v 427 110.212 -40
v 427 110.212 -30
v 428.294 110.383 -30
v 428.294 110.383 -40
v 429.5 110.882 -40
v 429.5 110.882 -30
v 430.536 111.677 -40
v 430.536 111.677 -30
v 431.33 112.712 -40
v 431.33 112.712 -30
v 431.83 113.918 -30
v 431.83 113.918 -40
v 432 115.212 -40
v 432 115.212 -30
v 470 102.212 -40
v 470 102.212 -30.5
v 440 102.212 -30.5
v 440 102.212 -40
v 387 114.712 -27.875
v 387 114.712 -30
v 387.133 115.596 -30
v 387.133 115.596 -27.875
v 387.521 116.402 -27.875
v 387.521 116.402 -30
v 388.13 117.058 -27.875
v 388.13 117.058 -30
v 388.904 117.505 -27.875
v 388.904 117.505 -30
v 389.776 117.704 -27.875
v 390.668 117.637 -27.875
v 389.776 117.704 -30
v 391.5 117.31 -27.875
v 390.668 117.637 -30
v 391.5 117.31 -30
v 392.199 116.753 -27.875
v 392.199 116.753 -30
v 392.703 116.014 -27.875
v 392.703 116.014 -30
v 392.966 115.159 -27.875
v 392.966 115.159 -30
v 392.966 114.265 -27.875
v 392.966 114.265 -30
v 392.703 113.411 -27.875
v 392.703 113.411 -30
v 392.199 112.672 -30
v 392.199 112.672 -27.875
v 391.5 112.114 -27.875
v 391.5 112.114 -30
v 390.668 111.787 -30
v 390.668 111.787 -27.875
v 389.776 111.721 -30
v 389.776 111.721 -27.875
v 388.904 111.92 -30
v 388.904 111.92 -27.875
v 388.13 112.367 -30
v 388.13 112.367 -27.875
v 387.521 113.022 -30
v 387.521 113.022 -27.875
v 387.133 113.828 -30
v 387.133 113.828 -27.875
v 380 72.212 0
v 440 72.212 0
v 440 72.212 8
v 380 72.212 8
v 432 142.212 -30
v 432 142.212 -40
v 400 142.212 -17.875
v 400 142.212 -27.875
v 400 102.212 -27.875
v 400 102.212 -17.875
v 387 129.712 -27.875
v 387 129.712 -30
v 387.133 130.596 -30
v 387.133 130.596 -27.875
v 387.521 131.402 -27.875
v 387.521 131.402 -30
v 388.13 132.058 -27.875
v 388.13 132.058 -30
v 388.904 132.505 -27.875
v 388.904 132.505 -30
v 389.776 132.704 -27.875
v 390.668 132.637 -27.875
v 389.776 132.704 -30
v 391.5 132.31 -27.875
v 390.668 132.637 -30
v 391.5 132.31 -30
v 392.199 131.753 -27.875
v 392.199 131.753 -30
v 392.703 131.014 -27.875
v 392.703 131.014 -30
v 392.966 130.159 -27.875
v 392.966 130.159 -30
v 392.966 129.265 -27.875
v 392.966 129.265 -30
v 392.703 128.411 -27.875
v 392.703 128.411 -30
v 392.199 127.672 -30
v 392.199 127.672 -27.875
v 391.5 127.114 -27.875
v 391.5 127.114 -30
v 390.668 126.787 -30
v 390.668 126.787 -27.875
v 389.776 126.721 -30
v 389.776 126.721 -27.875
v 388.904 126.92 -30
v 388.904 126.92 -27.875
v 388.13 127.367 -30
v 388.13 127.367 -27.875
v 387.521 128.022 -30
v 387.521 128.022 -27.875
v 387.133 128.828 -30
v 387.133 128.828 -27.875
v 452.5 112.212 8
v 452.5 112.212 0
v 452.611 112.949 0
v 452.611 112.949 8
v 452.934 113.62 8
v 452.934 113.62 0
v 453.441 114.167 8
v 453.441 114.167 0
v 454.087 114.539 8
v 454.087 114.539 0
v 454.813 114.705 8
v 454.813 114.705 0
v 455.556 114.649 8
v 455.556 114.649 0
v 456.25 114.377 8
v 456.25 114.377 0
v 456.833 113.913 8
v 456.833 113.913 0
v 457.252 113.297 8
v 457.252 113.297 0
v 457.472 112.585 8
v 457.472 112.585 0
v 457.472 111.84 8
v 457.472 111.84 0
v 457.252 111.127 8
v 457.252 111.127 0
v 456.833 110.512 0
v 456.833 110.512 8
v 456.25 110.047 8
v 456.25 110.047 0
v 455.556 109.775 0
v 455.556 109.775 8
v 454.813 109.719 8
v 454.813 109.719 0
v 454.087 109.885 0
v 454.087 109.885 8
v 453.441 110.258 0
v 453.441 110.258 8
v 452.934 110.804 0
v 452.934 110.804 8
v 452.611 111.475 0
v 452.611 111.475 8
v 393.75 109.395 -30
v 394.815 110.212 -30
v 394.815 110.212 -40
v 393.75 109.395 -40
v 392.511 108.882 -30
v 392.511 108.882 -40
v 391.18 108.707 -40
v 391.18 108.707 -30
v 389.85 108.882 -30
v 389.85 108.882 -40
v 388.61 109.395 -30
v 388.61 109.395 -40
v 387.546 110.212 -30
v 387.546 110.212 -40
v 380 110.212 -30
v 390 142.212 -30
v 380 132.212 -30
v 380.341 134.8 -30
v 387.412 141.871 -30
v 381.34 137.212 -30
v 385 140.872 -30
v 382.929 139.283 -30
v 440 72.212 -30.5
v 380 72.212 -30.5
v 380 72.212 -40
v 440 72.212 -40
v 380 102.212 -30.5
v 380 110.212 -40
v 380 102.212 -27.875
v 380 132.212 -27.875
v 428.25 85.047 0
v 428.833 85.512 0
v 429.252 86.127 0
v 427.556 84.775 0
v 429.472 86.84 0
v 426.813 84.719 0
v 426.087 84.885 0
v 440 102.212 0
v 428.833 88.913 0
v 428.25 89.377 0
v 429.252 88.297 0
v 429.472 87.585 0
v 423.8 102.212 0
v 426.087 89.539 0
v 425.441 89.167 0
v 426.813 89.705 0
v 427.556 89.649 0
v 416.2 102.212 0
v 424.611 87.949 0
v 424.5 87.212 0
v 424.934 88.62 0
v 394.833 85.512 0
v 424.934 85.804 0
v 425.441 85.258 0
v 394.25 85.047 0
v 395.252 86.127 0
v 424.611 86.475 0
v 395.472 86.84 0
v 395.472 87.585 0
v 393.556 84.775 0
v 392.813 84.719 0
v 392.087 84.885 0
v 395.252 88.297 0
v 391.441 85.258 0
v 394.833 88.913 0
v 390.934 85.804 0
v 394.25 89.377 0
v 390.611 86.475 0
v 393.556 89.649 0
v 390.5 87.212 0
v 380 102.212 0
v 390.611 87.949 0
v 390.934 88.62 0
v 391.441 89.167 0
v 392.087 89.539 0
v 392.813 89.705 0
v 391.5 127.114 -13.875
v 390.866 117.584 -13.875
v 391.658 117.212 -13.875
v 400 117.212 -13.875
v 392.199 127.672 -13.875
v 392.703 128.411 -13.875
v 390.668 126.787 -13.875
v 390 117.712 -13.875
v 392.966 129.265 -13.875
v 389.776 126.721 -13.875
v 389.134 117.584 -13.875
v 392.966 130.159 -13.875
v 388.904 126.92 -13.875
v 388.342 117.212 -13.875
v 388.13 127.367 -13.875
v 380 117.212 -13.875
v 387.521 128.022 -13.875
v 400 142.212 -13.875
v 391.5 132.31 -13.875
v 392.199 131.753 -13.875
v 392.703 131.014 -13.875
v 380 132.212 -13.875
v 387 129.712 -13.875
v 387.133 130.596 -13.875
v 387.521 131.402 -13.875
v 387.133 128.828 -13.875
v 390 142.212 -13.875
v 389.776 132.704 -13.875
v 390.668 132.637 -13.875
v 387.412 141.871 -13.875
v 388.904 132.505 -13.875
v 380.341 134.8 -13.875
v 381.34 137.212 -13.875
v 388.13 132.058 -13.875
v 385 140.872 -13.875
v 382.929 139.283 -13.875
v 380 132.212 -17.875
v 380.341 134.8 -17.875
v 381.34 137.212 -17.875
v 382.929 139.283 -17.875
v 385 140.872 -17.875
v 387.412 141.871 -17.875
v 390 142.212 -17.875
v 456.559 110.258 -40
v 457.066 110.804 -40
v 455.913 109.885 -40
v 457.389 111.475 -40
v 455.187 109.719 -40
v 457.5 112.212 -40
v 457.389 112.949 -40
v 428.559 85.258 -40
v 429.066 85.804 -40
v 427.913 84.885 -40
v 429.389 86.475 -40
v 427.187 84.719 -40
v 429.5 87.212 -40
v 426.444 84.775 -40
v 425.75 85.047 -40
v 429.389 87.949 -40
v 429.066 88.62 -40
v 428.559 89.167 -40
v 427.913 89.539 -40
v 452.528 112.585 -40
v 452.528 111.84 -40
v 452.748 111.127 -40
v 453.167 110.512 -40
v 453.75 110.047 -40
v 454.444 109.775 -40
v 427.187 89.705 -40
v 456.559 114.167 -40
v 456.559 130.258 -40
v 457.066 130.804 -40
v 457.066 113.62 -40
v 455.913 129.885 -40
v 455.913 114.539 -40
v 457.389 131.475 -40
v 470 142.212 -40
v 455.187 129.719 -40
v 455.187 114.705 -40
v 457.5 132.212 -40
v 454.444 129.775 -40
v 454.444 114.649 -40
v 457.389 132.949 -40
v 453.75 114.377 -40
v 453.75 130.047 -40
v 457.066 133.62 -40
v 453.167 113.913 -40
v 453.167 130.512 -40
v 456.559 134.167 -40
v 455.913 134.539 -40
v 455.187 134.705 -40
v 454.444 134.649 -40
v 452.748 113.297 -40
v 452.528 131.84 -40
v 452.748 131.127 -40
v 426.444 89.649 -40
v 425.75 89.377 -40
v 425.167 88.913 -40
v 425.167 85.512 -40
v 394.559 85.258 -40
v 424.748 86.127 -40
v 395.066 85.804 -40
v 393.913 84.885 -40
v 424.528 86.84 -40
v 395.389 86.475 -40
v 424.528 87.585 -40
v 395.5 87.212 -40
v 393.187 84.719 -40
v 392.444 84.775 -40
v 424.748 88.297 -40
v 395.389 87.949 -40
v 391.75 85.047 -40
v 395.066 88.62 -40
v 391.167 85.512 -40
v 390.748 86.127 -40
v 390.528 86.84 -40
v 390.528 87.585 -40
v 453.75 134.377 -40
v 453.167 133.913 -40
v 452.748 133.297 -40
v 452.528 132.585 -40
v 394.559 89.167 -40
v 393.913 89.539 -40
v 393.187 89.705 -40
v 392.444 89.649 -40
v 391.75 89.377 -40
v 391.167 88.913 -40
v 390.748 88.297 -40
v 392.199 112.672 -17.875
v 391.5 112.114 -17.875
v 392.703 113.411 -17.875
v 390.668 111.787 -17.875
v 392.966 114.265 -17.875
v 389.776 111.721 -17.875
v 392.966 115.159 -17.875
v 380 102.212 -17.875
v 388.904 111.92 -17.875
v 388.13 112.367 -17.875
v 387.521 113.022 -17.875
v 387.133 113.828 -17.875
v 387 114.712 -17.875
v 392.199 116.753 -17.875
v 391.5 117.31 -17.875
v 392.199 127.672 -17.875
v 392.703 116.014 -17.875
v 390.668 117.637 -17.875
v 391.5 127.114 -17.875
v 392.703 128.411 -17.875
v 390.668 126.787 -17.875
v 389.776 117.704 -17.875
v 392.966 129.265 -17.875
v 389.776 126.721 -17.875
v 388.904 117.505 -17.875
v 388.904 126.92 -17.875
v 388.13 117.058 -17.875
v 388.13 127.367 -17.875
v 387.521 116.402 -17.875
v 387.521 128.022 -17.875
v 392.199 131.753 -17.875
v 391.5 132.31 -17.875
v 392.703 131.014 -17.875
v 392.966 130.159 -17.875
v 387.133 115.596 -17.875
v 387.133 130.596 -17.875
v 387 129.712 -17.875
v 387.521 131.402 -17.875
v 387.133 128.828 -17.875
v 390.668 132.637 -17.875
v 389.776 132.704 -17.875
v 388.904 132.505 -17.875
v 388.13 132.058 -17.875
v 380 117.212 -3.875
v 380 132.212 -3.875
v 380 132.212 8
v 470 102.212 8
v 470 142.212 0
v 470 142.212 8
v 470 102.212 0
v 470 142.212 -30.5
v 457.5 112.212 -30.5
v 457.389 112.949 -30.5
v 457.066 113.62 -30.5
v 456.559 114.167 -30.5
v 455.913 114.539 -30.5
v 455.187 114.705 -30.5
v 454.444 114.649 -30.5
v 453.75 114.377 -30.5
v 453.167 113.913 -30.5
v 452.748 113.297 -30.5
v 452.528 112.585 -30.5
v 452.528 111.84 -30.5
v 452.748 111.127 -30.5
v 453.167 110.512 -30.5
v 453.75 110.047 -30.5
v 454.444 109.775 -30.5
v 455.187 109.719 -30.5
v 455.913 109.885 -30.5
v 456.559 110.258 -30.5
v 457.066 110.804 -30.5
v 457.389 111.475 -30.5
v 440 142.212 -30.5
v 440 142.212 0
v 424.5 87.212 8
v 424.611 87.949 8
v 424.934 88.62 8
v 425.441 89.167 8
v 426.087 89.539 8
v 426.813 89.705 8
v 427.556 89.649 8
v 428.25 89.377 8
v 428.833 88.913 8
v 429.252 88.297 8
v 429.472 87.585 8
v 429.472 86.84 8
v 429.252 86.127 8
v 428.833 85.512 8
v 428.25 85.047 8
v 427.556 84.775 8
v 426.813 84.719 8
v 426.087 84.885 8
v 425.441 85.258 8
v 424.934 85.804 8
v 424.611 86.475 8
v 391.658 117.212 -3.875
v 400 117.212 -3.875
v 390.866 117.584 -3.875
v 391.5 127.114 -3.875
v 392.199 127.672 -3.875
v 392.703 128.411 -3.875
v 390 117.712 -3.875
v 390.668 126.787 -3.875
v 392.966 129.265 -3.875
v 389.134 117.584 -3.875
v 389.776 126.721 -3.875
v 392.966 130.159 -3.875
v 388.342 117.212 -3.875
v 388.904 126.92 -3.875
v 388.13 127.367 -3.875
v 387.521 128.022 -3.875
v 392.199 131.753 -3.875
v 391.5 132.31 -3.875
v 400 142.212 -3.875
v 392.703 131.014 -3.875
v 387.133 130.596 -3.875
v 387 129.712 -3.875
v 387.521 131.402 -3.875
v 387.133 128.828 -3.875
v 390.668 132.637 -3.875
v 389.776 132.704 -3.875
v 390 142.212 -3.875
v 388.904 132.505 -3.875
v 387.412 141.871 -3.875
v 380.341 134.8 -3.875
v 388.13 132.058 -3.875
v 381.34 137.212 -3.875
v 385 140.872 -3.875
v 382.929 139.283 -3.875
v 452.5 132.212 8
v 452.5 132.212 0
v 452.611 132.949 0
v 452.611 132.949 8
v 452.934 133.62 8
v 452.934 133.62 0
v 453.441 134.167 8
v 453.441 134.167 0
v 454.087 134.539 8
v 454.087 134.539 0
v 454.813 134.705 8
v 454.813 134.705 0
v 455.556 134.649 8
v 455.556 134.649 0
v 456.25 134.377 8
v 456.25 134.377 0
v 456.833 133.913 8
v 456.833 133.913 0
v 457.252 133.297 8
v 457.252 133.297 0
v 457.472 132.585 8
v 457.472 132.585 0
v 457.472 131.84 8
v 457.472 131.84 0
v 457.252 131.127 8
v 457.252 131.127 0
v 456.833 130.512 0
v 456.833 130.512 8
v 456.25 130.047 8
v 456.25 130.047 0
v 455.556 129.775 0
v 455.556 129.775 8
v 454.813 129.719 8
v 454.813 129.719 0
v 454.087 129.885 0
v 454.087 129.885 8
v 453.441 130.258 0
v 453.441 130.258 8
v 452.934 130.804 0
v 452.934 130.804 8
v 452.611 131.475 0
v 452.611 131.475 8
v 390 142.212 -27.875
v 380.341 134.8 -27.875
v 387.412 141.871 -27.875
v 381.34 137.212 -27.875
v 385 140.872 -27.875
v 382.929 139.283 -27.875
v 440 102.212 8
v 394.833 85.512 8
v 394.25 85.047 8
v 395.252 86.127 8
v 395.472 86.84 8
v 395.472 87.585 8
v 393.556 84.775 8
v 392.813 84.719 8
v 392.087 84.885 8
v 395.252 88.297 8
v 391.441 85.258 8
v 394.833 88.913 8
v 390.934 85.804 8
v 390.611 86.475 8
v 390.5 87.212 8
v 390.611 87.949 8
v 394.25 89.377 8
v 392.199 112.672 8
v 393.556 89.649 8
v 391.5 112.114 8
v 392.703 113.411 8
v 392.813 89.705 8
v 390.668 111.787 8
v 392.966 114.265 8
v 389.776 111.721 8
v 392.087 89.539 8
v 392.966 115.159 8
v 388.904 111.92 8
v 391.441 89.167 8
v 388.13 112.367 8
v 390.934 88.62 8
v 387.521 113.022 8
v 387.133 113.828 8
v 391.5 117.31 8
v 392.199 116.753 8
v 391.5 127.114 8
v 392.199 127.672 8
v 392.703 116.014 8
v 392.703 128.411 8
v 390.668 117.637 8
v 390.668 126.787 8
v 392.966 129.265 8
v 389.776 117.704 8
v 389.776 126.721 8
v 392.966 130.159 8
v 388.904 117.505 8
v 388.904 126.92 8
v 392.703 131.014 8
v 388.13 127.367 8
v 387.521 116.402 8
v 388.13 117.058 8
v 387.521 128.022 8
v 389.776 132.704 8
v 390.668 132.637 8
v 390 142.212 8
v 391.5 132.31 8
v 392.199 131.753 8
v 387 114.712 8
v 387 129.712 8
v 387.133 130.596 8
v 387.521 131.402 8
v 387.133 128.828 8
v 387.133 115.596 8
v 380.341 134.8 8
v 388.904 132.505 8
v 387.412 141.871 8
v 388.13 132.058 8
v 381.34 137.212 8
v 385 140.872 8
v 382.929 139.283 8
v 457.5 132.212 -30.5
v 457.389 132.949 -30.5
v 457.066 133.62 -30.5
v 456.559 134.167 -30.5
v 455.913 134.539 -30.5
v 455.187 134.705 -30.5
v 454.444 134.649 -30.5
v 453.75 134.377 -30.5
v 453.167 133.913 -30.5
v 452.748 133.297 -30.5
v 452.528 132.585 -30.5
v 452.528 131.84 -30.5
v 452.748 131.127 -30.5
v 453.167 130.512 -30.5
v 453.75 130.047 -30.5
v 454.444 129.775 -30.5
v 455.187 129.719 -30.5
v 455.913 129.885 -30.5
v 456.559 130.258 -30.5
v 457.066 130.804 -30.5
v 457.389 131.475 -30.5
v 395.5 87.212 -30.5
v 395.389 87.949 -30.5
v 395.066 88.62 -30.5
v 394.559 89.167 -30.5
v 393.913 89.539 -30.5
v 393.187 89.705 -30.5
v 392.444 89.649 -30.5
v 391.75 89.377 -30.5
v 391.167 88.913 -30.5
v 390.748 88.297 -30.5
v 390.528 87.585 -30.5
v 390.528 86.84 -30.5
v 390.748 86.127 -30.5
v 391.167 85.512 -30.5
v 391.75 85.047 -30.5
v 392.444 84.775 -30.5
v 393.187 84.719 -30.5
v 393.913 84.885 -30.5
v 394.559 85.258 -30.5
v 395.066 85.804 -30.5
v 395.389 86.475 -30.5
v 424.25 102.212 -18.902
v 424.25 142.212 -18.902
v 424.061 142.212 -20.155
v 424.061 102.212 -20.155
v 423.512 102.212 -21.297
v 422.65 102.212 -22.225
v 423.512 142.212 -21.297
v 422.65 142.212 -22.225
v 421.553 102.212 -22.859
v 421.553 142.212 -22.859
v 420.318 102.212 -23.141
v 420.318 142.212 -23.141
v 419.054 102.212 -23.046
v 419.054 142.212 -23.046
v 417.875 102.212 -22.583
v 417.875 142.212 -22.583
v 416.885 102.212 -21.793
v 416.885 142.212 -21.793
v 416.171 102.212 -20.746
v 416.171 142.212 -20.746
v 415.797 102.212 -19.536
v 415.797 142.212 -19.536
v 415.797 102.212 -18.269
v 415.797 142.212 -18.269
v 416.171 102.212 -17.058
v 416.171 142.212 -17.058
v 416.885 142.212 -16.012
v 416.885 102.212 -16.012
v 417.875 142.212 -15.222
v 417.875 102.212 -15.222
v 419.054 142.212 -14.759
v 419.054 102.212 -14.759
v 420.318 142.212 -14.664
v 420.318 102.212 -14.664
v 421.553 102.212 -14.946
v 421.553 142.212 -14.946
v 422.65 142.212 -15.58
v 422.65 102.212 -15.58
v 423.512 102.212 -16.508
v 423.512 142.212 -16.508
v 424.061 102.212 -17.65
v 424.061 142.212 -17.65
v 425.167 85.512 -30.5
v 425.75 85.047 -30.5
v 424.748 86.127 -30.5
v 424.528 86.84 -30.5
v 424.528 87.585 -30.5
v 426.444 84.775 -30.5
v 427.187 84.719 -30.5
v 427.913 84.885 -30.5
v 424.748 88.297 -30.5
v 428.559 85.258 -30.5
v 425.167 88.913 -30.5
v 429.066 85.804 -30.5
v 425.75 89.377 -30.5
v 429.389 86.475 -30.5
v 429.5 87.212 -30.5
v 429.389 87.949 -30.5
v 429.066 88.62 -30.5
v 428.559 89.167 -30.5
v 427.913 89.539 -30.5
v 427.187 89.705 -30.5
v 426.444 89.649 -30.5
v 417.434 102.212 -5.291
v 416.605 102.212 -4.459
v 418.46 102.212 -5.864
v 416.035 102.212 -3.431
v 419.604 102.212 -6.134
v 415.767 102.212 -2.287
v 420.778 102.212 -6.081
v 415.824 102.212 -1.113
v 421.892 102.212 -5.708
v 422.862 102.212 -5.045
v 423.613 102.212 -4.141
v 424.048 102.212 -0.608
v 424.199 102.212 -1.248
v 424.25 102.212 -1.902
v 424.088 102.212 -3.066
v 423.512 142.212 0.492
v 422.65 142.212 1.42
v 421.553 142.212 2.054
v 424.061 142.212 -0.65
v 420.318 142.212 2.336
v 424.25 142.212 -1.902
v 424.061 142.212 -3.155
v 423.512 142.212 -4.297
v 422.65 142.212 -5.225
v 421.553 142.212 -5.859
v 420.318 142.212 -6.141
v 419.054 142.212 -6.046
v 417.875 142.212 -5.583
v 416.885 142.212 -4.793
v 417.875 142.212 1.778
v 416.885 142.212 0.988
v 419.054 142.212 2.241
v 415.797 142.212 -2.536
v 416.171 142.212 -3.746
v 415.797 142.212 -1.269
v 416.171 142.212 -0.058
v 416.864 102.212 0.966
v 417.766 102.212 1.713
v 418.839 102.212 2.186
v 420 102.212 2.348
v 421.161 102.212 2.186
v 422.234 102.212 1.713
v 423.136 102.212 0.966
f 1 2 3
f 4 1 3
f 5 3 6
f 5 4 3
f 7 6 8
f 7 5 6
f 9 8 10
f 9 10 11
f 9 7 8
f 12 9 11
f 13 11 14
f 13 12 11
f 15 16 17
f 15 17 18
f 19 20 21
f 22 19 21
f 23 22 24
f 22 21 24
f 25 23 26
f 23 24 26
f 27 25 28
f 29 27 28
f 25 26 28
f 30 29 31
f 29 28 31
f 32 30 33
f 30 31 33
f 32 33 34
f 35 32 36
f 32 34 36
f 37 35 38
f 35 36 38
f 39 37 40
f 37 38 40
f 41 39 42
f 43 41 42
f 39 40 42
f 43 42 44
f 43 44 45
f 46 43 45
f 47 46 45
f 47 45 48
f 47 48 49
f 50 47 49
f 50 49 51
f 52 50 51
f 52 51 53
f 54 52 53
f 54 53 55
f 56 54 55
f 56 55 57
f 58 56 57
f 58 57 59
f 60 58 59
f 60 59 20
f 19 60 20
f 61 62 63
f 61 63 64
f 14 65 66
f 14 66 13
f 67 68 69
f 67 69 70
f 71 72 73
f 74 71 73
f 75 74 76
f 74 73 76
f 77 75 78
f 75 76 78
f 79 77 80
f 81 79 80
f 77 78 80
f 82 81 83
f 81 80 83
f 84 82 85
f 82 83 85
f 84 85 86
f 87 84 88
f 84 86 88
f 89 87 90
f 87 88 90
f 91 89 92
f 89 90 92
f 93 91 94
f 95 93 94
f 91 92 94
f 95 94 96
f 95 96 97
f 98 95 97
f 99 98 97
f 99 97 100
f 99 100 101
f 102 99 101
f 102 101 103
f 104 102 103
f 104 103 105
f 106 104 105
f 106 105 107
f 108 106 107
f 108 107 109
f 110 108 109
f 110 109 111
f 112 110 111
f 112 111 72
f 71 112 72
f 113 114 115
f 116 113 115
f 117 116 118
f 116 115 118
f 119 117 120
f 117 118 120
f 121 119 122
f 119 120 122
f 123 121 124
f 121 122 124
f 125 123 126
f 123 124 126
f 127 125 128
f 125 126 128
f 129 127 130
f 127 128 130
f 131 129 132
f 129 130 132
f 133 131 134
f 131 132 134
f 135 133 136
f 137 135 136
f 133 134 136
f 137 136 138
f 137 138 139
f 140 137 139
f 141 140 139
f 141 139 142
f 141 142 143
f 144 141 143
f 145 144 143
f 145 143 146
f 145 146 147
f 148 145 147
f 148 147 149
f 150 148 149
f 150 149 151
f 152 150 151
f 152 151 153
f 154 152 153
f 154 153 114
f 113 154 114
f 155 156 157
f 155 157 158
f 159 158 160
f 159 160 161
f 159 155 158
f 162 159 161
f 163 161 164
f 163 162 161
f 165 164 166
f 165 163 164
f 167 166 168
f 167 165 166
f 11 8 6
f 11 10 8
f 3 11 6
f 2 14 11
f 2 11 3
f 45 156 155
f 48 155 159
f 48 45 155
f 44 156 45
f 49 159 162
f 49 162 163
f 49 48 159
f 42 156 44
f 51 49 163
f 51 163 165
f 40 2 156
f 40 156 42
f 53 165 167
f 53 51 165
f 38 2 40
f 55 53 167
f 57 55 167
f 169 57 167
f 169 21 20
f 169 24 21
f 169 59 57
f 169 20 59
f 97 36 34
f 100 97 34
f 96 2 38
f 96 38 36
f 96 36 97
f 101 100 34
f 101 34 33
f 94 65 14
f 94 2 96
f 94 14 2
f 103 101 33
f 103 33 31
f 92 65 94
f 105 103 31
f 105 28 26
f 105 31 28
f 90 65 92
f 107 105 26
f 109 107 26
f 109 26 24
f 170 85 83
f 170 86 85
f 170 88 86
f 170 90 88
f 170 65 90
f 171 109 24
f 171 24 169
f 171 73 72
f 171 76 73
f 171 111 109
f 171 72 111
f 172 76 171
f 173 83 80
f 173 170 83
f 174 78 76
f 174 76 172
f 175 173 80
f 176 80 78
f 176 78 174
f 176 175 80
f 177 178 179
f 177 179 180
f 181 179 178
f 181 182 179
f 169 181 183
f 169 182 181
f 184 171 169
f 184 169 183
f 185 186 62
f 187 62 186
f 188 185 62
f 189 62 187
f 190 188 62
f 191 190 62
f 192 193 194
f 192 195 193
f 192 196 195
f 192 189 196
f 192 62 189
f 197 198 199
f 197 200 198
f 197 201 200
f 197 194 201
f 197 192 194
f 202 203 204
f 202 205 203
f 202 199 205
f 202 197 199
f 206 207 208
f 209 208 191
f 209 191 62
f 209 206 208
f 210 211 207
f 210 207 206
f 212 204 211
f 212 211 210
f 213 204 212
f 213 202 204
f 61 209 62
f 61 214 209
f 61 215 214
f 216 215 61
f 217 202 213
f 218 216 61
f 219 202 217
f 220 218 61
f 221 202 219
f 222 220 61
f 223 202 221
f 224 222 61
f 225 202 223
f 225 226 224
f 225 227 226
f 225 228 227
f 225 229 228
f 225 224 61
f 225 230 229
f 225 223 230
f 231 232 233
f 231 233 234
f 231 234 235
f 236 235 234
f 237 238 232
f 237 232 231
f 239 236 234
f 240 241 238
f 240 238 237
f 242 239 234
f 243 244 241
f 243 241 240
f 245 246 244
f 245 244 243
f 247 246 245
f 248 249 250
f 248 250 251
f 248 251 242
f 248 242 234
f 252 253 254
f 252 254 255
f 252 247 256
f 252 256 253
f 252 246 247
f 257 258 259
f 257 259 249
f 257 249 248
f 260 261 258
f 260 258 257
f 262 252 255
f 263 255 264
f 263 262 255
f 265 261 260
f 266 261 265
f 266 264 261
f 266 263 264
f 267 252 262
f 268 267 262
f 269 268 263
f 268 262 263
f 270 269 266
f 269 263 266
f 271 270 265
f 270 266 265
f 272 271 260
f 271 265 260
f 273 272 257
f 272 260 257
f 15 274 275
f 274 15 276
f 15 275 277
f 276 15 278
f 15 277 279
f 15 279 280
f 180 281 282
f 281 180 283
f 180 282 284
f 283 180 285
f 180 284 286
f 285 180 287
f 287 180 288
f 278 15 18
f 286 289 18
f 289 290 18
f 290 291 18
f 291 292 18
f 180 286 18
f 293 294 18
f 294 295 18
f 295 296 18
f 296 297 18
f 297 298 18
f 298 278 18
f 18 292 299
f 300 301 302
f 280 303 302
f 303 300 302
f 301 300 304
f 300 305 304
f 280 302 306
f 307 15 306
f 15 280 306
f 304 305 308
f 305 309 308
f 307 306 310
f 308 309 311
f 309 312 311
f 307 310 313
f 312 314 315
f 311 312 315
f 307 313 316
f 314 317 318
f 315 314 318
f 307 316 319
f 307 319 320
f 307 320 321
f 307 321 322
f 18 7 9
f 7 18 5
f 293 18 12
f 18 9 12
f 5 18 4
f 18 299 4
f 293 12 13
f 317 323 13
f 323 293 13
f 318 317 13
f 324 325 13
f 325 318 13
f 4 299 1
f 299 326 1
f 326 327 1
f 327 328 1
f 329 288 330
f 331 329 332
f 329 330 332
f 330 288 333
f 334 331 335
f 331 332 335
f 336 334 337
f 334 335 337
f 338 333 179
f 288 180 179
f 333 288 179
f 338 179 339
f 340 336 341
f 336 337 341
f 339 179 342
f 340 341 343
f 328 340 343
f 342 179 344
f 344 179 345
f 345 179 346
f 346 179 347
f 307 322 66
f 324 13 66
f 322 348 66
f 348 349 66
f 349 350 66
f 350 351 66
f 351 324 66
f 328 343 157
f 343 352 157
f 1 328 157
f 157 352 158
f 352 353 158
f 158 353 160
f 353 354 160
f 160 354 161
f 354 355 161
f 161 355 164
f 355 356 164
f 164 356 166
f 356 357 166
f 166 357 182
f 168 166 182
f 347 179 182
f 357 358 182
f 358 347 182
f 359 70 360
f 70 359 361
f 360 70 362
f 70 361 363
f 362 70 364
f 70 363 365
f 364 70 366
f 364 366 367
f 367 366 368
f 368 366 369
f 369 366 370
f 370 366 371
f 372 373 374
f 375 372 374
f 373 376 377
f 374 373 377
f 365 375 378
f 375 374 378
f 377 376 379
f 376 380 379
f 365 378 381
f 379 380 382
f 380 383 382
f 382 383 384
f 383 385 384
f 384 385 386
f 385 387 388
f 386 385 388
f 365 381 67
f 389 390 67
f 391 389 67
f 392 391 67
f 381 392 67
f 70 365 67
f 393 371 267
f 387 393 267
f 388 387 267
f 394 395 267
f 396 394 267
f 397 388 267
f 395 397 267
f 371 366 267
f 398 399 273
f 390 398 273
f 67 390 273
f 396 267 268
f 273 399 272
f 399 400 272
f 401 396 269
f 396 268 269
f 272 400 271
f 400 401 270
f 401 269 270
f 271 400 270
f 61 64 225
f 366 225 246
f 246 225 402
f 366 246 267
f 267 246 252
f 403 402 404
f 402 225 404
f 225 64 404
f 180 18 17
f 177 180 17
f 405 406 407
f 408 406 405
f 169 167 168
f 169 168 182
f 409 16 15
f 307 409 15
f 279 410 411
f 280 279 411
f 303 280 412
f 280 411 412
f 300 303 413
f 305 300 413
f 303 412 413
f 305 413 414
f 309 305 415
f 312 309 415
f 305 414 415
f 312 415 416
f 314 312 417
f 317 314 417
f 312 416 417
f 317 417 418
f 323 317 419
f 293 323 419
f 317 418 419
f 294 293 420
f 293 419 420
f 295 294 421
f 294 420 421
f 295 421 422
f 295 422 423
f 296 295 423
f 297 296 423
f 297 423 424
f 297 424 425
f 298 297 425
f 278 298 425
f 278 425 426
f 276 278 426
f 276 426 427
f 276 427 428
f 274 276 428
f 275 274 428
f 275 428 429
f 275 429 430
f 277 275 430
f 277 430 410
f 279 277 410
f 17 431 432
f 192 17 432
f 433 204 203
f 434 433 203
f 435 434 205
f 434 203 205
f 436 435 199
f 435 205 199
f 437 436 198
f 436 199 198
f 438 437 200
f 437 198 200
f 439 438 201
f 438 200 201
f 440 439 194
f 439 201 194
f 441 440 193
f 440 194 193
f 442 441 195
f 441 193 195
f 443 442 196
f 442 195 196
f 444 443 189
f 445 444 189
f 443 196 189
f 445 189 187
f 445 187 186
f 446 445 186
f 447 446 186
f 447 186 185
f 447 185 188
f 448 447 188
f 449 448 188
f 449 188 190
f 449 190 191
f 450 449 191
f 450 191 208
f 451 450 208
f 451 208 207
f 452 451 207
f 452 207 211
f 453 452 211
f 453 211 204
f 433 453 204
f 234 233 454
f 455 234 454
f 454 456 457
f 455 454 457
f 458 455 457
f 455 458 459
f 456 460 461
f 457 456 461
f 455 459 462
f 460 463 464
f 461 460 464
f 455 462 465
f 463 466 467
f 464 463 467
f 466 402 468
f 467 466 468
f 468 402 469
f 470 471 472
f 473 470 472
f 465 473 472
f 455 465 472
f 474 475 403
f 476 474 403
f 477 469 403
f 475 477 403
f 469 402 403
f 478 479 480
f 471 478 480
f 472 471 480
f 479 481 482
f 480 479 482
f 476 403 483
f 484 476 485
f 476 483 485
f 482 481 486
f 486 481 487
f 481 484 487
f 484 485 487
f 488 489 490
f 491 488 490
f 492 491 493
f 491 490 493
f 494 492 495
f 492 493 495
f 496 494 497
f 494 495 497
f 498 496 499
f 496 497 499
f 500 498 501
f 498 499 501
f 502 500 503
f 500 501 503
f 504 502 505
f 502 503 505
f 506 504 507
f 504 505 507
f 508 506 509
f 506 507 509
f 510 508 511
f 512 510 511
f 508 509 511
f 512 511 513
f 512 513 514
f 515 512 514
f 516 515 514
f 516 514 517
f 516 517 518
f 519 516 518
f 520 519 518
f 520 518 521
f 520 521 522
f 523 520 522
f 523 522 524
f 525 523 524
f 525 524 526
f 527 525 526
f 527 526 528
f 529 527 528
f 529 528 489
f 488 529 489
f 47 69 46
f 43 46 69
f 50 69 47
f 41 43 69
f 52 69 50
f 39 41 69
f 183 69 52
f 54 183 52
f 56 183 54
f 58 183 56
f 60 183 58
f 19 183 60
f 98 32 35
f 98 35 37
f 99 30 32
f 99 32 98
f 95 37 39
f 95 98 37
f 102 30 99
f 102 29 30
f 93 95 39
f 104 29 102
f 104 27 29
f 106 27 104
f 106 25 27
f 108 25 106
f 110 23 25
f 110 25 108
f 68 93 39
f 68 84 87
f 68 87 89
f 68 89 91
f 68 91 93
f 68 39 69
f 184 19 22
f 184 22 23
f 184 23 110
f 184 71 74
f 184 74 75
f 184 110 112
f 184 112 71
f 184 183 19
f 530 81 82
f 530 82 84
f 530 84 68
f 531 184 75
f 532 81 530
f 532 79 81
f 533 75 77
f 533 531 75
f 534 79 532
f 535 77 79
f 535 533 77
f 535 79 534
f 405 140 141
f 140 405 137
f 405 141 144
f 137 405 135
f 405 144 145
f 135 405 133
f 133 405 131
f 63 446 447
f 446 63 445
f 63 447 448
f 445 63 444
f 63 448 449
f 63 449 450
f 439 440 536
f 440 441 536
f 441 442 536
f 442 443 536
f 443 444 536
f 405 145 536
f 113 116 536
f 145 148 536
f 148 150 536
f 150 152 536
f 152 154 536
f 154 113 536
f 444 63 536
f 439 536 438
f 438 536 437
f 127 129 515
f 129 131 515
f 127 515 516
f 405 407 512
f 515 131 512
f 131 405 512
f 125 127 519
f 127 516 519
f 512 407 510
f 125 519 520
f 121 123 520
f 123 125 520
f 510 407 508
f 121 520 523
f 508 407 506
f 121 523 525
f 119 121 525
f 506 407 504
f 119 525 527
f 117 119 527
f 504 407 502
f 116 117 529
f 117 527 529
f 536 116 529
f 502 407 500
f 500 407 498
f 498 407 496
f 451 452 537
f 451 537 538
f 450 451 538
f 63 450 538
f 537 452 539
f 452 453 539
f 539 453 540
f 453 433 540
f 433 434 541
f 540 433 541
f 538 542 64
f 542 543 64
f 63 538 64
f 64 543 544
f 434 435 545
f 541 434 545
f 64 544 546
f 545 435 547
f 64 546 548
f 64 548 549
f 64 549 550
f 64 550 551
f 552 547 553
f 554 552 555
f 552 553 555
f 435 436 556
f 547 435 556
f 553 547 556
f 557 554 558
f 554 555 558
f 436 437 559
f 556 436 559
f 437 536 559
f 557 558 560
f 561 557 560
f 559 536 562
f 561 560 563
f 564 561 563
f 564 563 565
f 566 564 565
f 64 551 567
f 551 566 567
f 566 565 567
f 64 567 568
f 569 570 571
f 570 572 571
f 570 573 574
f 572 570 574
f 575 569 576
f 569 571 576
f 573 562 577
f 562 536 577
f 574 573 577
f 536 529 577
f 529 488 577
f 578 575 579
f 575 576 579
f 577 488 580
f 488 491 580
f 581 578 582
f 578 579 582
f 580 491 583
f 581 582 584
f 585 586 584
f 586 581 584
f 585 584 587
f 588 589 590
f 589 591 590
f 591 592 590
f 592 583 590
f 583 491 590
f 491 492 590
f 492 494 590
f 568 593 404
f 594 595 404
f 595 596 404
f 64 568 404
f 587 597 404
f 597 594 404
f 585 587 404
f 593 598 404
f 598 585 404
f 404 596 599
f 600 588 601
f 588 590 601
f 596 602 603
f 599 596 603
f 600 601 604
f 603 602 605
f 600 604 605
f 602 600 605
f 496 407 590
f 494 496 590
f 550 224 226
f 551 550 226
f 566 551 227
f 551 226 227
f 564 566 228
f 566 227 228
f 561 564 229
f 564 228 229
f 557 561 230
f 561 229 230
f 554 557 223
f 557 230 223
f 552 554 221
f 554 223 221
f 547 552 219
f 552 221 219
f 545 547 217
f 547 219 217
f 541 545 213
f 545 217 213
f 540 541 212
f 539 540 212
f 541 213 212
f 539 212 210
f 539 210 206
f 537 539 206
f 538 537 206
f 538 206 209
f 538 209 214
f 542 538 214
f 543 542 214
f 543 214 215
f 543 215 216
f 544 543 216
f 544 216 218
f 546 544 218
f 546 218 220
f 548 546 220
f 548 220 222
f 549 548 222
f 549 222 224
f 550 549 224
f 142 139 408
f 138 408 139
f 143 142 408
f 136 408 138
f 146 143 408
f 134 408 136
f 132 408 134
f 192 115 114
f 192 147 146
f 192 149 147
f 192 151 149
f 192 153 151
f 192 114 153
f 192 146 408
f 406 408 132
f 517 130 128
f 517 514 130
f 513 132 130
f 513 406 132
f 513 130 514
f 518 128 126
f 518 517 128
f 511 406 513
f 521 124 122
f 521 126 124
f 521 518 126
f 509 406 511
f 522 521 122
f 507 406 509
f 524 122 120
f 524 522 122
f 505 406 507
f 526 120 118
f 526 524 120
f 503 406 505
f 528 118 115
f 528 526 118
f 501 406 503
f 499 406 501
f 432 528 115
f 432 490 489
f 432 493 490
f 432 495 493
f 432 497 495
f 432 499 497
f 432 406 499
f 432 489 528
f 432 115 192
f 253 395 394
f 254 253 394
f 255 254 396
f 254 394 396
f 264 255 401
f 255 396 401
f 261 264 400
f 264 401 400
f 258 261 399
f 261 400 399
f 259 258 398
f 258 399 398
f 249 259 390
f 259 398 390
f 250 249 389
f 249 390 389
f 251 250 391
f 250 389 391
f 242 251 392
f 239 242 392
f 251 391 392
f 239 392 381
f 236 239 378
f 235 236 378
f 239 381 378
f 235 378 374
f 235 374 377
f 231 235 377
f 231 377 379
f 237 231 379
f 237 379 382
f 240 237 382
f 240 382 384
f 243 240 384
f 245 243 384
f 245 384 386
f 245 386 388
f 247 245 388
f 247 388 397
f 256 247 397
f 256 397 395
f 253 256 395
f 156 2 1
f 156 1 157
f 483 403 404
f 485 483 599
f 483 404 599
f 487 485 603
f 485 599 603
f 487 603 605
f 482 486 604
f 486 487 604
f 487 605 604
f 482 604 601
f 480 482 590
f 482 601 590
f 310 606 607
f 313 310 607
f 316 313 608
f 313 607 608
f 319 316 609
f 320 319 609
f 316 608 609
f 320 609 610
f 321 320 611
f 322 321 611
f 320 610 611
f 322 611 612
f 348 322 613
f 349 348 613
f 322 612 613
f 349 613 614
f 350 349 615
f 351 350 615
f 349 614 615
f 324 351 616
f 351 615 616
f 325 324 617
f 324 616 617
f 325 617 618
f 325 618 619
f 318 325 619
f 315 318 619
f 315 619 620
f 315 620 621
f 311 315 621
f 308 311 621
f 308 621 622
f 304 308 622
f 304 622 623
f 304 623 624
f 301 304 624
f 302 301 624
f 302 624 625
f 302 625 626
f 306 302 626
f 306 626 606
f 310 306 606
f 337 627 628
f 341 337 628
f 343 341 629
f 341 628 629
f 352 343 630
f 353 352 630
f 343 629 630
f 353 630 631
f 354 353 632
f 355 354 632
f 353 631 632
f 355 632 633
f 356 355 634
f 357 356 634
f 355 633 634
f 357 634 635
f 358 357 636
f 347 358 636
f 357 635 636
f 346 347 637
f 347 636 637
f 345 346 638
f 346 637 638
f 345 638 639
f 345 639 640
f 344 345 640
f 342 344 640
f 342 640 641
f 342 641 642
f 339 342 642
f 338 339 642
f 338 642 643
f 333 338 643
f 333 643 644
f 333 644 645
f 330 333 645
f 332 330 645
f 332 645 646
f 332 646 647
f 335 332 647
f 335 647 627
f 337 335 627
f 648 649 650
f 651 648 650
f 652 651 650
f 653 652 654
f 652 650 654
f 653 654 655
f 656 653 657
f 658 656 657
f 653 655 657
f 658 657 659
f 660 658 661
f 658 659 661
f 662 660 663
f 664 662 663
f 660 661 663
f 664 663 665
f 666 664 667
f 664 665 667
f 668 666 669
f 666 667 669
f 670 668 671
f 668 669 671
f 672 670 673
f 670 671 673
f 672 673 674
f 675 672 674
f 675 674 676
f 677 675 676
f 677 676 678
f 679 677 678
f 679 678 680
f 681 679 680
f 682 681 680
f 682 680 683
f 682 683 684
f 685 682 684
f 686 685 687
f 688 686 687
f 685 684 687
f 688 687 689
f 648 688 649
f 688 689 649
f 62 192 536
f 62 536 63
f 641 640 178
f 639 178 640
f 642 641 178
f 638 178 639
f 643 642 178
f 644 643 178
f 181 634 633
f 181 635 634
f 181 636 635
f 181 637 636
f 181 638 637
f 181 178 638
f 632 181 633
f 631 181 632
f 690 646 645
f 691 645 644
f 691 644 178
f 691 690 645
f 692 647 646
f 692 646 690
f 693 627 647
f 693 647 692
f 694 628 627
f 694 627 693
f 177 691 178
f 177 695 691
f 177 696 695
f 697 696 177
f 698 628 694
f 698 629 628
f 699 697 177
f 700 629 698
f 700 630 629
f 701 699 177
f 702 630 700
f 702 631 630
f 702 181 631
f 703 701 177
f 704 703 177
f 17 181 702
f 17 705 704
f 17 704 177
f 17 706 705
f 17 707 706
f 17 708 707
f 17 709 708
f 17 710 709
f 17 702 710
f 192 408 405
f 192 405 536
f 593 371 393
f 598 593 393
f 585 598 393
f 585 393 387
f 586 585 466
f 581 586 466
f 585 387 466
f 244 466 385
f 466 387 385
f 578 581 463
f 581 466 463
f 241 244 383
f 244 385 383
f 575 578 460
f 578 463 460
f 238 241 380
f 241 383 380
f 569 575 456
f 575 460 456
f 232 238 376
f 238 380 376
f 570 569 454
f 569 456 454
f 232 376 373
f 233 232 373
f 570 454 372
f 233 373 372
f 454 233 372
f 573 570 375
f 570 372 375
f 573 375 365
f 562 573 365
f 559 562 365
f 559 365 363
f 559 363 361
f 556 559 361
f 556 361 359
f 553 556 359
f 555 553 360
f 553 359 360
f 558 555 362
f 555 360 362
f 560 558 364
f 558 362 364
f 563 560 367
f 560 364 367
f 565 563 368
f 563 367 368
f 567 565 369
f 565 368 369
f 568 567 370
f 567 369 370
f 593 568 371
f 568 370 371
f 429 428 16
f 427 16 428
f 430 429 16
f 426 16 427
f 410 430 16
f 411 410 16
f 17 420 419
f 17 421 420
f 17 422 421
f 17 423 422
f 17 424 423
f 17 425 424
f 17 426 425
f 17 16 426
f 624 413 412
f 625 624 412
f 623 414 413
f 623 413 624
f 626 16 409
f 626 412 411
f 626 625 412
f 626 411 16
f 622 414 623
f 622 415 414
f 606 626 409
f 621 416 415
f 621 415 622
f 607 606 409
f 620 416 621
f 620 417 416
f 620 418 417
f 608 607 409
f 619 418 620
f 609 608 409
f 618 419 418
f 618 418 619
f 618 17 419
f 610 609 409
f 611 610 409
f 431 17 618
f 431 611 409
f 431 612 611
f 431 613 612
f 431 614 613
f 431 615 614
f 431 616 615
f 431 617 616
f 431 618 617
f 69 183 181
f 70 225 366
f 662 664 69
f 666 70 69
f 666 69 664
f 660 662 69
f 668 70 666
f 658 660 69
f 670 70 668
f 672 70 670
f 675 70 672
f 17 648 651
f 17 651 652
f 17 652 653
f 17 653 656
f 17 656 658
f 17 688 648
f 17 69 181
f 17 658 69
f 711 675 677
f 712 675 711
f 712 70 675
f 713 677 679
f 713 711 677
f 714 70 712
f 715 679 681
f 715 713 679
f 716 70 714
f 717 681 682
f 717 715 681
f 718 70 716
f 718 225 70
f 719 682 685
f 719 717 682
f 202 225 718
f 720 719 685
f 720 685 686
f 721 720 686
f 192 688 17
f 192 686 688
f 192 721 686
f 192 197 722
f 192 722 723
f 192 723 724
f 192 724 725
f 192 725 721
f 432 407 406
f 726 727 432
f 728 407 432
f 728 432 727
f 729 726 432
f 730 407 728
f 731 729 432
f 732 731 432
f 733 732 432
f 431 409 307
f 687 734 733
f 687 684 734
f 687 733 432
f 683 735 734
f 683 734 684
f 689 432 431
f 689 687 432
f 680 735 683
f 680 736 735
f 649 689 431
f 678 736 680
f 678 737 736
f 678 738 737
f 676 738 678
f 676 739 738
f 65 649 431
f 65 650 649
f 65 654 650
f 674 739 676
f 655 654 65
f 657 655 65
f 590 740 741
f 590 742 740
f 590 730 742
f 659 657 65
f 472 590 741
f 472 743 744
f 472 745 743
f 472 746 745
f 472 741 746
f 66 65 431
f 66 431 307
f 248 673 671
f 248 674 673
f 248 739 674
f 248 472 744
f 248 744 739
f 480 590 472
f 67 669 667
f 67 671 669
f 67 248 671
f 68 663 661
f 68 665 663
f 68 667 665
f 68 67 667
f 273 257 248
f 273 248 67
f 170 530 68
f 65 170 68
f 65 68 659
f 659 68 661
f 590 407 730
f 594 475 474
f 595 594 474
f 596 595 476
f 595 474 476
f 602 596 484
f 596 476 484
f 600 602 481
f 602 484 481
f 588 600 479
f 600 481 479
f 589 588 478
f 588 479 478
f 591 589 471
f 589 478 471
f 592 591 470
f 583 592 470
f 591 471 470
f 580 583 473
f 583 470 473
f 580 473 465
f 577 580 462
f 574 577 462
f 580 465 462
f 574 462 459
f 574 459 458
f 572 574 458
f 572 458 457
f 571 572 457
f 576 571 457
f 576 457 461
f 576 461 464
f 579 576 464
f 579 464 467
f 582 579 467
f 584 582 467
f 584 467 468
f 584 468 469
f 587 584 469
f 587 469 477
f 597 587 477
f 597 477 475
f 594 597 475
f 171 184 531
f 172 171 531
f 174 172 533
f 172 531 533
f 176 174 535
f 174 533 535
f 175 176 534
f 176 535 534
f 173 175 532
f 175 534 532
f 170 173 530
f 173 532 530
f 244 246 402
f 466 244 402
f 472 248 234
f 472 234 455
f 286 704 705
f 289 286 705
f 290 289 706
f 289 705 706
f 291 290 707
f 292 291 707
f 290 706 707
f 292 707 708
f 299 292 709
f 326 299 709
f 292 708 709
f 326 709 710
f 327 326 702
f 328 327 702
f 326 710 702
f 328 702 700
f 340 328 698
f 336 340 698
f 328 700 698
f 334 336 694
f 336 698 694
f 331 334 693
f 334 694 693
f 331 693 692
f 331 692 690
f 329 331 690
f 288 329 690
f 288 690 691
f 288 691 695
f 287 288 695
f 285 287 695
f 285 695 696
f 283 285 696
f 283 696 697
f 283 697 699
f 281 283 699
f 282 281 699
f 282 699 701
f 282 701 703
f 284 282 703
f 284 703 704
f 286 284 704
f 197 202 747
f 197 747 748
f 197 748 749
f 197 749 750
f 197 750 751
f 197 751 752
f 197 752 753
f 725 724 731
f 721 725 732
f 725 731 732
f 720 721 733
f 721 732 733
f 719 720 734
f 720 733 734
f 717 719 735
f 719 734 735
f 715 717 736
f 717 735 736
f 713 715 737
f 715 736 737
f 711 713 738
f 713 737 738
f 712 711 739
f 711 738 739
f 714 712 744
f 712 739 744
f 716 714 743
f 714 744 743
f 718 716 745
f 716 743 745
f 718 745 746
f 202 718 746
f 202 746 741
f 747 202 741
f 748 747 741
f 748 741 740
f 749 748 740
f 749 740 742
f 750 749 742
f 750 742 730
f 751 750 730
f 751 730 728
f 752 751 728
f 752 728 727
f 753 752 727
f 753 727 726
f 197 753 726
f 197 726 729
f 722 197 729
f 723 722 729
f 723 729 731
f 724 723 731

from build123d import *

# Parameters (mm, degrees)
RESSALTO_EXTRUS_O1_DEPTH                   = 8
BROCA_DE_ROSQUEAR_PARA_TARRAXA_DE_M6X1_0_D = 5
RESSALTO_EXTRUS_O2_DEPTH                   = 30
ESBO_O6_W                                  = 10
ESBO_O6_H                                  = 40
ESBO_O6_H_2                                = 25
CORTE_EXTRUS_O2_DEPTH                      = 20
ESBO_O14_R                                 = 3
CORTE_EXTRUS_O6_DEPTH                      = 39
ESBO_O15_R                                 = 4.25
CORTE_EXTRUS_O7_DEPTH                      = 40
RESSALTO_EXTRUS_O3_DEPTH                   = 10
ESBO_O17_W                                 = 60
ESBO_O17_H                                 = 9.5
RESSALTO_EXTRUS_O4_DEPTH                   = 30
ESBO_O18_W                                 = 9.5
ESBO_O18_H                                 = 40
RESSALTO_EXTRUS_O5_DEPTH                   = 30
FILETE1_R                                  = 5
ESBO_O19_R                                 = 2.5
CORTE_EXTRUS_O8_DEPTH                      = 10
ESBO_O20_R                                 = 2.5
CORTE_EXTRUS_O9_DEPTH                      = 10


with BuildPart() as part:
    # Esboço1 → Ressalto-extrusão1 (new body)
    with BuildSketch(Plane.XY):
        with BuildLine():
            Line((440, 72.212171493), (380, 72.212171493))
            Line((380, 72.212171493), (380, 132.212171493))
            ThreePointArc((380, 132.212171493), (382.928932188, 139.283239304), (390, 142.212171493))
            Line((390, 142.212171493), (470, 142.212171493))
            Line((470, 142.212171493), (470, 102.212171493))
            Line((470, 102.212171493), (440, 102.212171493))
            Line((440, 102.212171493), (440, 72.212171493))
        make_face()
    extrude(amount=RESSALTO_EXTRUS_O1_DEPTH)

    # Broca de rosquear para tarraxa de M6x1.01 (through all)
    with Locations(Plane.XY.offset(8)):
        with Locations((393, 87.212171493), (427, 87.212171493), (455, 112.212171493), (455, 132.212171493)):
            Hole(BROCA_DE_ROSQUEAR_PARA_TARRAXA_DE_M6X1_0_D / 2)

    # Esboço4 → Ressalto-extrusão2 (add)
    with BuildSketch(Plane(origin=(0, 0, 0), x_dir=(-1, 0, 0), z_dir=(0, 0, -1))):
        with BuildLine():
            Line((-390, 142.212171493), (-440, 142.212171493))
            Line((-440, 142.212171493), (-440, 102.212171493))
            Line((-440, 102.212171493), (-380, 102.212171493))
            Line((-380, 102.212171493), (-380, 132.212171493))
            ThreePointArc((-380, 132.212171493), (-382.928932188, 139.283239304), (-390, 142.212171493))
        make_face()
    extrude(amount=RESSALTO_EXTRUS_O2_DEPTH)

    # Esboço6 → Corte-extrusão2 (cut)
    with BuildSketch(Plane.ZY.offset(-380)):
        with Locations((-22.874860756, 122.212171493)):
            Rectangle(ESBO_O6_W, ESBO_O6_H)
        with Locations((-8.874860756, 129.712171493)):
            Rectangle(ESBO_O6_W, ESBO_O6_H_2)
    extrude(amount=-CORTE_EXTRUS_O2_DEPTH, mode=Mode.SUBTRACT)

    # Esboço14 → Corte-extrusão6 (cut, through all)
    with BuildSketch(Plane(origin=(0, 0, -30), x_dir=(-1, 0, 0), z_dir=(0, 0, -1))):
        with Locations((-390, 129.712171493)):
            Circle(ESBO_O14_R)
        with Locations((-390, 114.712171493)):
            Circle(ESBO_O14_R)
    extrude(amount=-CORTE_EXTRUS_O6_DEPTH, mode=Mode.SUBTRACT)

    # Esboço15 → Corte-extrusão7 (cut)
    with BuildSketch(Plane(origin=(0, 142.212171493, 0), x_dir=(1, 0, 0), z_dir=(0, 1, 0))):
        with Locations((420, 18.90241208)):
            Circle(ESBO_O15_R)
        with Locations((420, 1.90241208)):
            Circle(ESBO_O15_R)
    extrude(amount=-CORTE_EXTRUS_O7_DEPTH, mode=Mode.SUBTRACT)

    # Esboço16 → Ressalto-extrusão3 (add)
    with BuildSketch(Plane(origin=(0, 0, -30), x_dir=(-1, 0, 0), z_dir=(0, 0, -1))):
        with BuildLine():
            Line((-380, 102.212171493), (-440, 102.212171493))
            Line((-440, 102.212171493), (-440, 110.212171493))
            Line((-440, 110.212171493), (-440, 142.212171493))
            Line((-440, 142.212171493), (-432, 142.212171493))
            Line((-432, 142.212171493), (-432, 110.212171493))
            Line((-432, 110.212171493), (-394.815024021, 110.212171493))
            ThreePointArc((-394.815024021, 110.212171493), (-391.180367629, 108.706647521), (-387.545711238, 110.212171493))
            Line((-387.545711238, 110.212171493), (-380, 110.212171493))
            Line((-380, 110.212171493), (-380, 102.212171493))
        make_face()
    extrude(amount=RESSALTO_EXTRUS_O3_DEPTH)

    # Esboço17 → Ressalto-extrusão4 (add, through all)
    with BuildSketch(Plane.XZ.offset(-102.212171493)):
        with Locations((410, -35.25)):
            Rectangle(ESBO_O17_W, ESBO_O17_H)
    extrude(amount=RESSALTO_EXTRUS_O4_DEPTH)

    # Esboço18 → Ressalto-extrusão5 (add, through all)
    with BuildSketch(Plane(origin=(440, 0, 0), x_dir=(0, 0, -1), z_dir=(1, 0, 0))):
        with Locations((35.25, 122.212171493)):
            Rectangle(ESBO_O18_W, ESBO_O18_H)
    extrude(amount=RESSALTO_EXTRUS_O5_DEPTH)

    # Filete1
    filete1_edges = [part.edges().sort_by_distance(p)[0] for p in [
        (432, 110.212171493, -35),
    ]]
    fillet(filete1_edges, radius=FILETE1_R)

    # Esboço19 → Corte-extrusão8 (cut)
    with BuildSketch(Plane.XY.offset(-30.5)):
        with Locations((455, 132.212171493)):
            Circle(ESBO_O19_R)
        with Locations((455, 112.212171493)):
            Circle(ESBO_O19_R)
    extrude(amount=-CORTE_EXTRUS_O8_DEPTH, mode=Mode.SUBTRACT)

    # Esboço20 → Corte-extrusão9 (cut)
    with BuildSketch(Plane.XY.offset(-30.5)):
        with Locations((427, 87.212171493)):
            Circle(ESBO_O20_R)
        with Locations((393, 87.212171493)):
            Circle(ESBO_O20_R)
    extrude(amount=-CORTE_EXTRUS_O9_DEPTH, mode=Mode.SUBTRACT)


solid = part.part
